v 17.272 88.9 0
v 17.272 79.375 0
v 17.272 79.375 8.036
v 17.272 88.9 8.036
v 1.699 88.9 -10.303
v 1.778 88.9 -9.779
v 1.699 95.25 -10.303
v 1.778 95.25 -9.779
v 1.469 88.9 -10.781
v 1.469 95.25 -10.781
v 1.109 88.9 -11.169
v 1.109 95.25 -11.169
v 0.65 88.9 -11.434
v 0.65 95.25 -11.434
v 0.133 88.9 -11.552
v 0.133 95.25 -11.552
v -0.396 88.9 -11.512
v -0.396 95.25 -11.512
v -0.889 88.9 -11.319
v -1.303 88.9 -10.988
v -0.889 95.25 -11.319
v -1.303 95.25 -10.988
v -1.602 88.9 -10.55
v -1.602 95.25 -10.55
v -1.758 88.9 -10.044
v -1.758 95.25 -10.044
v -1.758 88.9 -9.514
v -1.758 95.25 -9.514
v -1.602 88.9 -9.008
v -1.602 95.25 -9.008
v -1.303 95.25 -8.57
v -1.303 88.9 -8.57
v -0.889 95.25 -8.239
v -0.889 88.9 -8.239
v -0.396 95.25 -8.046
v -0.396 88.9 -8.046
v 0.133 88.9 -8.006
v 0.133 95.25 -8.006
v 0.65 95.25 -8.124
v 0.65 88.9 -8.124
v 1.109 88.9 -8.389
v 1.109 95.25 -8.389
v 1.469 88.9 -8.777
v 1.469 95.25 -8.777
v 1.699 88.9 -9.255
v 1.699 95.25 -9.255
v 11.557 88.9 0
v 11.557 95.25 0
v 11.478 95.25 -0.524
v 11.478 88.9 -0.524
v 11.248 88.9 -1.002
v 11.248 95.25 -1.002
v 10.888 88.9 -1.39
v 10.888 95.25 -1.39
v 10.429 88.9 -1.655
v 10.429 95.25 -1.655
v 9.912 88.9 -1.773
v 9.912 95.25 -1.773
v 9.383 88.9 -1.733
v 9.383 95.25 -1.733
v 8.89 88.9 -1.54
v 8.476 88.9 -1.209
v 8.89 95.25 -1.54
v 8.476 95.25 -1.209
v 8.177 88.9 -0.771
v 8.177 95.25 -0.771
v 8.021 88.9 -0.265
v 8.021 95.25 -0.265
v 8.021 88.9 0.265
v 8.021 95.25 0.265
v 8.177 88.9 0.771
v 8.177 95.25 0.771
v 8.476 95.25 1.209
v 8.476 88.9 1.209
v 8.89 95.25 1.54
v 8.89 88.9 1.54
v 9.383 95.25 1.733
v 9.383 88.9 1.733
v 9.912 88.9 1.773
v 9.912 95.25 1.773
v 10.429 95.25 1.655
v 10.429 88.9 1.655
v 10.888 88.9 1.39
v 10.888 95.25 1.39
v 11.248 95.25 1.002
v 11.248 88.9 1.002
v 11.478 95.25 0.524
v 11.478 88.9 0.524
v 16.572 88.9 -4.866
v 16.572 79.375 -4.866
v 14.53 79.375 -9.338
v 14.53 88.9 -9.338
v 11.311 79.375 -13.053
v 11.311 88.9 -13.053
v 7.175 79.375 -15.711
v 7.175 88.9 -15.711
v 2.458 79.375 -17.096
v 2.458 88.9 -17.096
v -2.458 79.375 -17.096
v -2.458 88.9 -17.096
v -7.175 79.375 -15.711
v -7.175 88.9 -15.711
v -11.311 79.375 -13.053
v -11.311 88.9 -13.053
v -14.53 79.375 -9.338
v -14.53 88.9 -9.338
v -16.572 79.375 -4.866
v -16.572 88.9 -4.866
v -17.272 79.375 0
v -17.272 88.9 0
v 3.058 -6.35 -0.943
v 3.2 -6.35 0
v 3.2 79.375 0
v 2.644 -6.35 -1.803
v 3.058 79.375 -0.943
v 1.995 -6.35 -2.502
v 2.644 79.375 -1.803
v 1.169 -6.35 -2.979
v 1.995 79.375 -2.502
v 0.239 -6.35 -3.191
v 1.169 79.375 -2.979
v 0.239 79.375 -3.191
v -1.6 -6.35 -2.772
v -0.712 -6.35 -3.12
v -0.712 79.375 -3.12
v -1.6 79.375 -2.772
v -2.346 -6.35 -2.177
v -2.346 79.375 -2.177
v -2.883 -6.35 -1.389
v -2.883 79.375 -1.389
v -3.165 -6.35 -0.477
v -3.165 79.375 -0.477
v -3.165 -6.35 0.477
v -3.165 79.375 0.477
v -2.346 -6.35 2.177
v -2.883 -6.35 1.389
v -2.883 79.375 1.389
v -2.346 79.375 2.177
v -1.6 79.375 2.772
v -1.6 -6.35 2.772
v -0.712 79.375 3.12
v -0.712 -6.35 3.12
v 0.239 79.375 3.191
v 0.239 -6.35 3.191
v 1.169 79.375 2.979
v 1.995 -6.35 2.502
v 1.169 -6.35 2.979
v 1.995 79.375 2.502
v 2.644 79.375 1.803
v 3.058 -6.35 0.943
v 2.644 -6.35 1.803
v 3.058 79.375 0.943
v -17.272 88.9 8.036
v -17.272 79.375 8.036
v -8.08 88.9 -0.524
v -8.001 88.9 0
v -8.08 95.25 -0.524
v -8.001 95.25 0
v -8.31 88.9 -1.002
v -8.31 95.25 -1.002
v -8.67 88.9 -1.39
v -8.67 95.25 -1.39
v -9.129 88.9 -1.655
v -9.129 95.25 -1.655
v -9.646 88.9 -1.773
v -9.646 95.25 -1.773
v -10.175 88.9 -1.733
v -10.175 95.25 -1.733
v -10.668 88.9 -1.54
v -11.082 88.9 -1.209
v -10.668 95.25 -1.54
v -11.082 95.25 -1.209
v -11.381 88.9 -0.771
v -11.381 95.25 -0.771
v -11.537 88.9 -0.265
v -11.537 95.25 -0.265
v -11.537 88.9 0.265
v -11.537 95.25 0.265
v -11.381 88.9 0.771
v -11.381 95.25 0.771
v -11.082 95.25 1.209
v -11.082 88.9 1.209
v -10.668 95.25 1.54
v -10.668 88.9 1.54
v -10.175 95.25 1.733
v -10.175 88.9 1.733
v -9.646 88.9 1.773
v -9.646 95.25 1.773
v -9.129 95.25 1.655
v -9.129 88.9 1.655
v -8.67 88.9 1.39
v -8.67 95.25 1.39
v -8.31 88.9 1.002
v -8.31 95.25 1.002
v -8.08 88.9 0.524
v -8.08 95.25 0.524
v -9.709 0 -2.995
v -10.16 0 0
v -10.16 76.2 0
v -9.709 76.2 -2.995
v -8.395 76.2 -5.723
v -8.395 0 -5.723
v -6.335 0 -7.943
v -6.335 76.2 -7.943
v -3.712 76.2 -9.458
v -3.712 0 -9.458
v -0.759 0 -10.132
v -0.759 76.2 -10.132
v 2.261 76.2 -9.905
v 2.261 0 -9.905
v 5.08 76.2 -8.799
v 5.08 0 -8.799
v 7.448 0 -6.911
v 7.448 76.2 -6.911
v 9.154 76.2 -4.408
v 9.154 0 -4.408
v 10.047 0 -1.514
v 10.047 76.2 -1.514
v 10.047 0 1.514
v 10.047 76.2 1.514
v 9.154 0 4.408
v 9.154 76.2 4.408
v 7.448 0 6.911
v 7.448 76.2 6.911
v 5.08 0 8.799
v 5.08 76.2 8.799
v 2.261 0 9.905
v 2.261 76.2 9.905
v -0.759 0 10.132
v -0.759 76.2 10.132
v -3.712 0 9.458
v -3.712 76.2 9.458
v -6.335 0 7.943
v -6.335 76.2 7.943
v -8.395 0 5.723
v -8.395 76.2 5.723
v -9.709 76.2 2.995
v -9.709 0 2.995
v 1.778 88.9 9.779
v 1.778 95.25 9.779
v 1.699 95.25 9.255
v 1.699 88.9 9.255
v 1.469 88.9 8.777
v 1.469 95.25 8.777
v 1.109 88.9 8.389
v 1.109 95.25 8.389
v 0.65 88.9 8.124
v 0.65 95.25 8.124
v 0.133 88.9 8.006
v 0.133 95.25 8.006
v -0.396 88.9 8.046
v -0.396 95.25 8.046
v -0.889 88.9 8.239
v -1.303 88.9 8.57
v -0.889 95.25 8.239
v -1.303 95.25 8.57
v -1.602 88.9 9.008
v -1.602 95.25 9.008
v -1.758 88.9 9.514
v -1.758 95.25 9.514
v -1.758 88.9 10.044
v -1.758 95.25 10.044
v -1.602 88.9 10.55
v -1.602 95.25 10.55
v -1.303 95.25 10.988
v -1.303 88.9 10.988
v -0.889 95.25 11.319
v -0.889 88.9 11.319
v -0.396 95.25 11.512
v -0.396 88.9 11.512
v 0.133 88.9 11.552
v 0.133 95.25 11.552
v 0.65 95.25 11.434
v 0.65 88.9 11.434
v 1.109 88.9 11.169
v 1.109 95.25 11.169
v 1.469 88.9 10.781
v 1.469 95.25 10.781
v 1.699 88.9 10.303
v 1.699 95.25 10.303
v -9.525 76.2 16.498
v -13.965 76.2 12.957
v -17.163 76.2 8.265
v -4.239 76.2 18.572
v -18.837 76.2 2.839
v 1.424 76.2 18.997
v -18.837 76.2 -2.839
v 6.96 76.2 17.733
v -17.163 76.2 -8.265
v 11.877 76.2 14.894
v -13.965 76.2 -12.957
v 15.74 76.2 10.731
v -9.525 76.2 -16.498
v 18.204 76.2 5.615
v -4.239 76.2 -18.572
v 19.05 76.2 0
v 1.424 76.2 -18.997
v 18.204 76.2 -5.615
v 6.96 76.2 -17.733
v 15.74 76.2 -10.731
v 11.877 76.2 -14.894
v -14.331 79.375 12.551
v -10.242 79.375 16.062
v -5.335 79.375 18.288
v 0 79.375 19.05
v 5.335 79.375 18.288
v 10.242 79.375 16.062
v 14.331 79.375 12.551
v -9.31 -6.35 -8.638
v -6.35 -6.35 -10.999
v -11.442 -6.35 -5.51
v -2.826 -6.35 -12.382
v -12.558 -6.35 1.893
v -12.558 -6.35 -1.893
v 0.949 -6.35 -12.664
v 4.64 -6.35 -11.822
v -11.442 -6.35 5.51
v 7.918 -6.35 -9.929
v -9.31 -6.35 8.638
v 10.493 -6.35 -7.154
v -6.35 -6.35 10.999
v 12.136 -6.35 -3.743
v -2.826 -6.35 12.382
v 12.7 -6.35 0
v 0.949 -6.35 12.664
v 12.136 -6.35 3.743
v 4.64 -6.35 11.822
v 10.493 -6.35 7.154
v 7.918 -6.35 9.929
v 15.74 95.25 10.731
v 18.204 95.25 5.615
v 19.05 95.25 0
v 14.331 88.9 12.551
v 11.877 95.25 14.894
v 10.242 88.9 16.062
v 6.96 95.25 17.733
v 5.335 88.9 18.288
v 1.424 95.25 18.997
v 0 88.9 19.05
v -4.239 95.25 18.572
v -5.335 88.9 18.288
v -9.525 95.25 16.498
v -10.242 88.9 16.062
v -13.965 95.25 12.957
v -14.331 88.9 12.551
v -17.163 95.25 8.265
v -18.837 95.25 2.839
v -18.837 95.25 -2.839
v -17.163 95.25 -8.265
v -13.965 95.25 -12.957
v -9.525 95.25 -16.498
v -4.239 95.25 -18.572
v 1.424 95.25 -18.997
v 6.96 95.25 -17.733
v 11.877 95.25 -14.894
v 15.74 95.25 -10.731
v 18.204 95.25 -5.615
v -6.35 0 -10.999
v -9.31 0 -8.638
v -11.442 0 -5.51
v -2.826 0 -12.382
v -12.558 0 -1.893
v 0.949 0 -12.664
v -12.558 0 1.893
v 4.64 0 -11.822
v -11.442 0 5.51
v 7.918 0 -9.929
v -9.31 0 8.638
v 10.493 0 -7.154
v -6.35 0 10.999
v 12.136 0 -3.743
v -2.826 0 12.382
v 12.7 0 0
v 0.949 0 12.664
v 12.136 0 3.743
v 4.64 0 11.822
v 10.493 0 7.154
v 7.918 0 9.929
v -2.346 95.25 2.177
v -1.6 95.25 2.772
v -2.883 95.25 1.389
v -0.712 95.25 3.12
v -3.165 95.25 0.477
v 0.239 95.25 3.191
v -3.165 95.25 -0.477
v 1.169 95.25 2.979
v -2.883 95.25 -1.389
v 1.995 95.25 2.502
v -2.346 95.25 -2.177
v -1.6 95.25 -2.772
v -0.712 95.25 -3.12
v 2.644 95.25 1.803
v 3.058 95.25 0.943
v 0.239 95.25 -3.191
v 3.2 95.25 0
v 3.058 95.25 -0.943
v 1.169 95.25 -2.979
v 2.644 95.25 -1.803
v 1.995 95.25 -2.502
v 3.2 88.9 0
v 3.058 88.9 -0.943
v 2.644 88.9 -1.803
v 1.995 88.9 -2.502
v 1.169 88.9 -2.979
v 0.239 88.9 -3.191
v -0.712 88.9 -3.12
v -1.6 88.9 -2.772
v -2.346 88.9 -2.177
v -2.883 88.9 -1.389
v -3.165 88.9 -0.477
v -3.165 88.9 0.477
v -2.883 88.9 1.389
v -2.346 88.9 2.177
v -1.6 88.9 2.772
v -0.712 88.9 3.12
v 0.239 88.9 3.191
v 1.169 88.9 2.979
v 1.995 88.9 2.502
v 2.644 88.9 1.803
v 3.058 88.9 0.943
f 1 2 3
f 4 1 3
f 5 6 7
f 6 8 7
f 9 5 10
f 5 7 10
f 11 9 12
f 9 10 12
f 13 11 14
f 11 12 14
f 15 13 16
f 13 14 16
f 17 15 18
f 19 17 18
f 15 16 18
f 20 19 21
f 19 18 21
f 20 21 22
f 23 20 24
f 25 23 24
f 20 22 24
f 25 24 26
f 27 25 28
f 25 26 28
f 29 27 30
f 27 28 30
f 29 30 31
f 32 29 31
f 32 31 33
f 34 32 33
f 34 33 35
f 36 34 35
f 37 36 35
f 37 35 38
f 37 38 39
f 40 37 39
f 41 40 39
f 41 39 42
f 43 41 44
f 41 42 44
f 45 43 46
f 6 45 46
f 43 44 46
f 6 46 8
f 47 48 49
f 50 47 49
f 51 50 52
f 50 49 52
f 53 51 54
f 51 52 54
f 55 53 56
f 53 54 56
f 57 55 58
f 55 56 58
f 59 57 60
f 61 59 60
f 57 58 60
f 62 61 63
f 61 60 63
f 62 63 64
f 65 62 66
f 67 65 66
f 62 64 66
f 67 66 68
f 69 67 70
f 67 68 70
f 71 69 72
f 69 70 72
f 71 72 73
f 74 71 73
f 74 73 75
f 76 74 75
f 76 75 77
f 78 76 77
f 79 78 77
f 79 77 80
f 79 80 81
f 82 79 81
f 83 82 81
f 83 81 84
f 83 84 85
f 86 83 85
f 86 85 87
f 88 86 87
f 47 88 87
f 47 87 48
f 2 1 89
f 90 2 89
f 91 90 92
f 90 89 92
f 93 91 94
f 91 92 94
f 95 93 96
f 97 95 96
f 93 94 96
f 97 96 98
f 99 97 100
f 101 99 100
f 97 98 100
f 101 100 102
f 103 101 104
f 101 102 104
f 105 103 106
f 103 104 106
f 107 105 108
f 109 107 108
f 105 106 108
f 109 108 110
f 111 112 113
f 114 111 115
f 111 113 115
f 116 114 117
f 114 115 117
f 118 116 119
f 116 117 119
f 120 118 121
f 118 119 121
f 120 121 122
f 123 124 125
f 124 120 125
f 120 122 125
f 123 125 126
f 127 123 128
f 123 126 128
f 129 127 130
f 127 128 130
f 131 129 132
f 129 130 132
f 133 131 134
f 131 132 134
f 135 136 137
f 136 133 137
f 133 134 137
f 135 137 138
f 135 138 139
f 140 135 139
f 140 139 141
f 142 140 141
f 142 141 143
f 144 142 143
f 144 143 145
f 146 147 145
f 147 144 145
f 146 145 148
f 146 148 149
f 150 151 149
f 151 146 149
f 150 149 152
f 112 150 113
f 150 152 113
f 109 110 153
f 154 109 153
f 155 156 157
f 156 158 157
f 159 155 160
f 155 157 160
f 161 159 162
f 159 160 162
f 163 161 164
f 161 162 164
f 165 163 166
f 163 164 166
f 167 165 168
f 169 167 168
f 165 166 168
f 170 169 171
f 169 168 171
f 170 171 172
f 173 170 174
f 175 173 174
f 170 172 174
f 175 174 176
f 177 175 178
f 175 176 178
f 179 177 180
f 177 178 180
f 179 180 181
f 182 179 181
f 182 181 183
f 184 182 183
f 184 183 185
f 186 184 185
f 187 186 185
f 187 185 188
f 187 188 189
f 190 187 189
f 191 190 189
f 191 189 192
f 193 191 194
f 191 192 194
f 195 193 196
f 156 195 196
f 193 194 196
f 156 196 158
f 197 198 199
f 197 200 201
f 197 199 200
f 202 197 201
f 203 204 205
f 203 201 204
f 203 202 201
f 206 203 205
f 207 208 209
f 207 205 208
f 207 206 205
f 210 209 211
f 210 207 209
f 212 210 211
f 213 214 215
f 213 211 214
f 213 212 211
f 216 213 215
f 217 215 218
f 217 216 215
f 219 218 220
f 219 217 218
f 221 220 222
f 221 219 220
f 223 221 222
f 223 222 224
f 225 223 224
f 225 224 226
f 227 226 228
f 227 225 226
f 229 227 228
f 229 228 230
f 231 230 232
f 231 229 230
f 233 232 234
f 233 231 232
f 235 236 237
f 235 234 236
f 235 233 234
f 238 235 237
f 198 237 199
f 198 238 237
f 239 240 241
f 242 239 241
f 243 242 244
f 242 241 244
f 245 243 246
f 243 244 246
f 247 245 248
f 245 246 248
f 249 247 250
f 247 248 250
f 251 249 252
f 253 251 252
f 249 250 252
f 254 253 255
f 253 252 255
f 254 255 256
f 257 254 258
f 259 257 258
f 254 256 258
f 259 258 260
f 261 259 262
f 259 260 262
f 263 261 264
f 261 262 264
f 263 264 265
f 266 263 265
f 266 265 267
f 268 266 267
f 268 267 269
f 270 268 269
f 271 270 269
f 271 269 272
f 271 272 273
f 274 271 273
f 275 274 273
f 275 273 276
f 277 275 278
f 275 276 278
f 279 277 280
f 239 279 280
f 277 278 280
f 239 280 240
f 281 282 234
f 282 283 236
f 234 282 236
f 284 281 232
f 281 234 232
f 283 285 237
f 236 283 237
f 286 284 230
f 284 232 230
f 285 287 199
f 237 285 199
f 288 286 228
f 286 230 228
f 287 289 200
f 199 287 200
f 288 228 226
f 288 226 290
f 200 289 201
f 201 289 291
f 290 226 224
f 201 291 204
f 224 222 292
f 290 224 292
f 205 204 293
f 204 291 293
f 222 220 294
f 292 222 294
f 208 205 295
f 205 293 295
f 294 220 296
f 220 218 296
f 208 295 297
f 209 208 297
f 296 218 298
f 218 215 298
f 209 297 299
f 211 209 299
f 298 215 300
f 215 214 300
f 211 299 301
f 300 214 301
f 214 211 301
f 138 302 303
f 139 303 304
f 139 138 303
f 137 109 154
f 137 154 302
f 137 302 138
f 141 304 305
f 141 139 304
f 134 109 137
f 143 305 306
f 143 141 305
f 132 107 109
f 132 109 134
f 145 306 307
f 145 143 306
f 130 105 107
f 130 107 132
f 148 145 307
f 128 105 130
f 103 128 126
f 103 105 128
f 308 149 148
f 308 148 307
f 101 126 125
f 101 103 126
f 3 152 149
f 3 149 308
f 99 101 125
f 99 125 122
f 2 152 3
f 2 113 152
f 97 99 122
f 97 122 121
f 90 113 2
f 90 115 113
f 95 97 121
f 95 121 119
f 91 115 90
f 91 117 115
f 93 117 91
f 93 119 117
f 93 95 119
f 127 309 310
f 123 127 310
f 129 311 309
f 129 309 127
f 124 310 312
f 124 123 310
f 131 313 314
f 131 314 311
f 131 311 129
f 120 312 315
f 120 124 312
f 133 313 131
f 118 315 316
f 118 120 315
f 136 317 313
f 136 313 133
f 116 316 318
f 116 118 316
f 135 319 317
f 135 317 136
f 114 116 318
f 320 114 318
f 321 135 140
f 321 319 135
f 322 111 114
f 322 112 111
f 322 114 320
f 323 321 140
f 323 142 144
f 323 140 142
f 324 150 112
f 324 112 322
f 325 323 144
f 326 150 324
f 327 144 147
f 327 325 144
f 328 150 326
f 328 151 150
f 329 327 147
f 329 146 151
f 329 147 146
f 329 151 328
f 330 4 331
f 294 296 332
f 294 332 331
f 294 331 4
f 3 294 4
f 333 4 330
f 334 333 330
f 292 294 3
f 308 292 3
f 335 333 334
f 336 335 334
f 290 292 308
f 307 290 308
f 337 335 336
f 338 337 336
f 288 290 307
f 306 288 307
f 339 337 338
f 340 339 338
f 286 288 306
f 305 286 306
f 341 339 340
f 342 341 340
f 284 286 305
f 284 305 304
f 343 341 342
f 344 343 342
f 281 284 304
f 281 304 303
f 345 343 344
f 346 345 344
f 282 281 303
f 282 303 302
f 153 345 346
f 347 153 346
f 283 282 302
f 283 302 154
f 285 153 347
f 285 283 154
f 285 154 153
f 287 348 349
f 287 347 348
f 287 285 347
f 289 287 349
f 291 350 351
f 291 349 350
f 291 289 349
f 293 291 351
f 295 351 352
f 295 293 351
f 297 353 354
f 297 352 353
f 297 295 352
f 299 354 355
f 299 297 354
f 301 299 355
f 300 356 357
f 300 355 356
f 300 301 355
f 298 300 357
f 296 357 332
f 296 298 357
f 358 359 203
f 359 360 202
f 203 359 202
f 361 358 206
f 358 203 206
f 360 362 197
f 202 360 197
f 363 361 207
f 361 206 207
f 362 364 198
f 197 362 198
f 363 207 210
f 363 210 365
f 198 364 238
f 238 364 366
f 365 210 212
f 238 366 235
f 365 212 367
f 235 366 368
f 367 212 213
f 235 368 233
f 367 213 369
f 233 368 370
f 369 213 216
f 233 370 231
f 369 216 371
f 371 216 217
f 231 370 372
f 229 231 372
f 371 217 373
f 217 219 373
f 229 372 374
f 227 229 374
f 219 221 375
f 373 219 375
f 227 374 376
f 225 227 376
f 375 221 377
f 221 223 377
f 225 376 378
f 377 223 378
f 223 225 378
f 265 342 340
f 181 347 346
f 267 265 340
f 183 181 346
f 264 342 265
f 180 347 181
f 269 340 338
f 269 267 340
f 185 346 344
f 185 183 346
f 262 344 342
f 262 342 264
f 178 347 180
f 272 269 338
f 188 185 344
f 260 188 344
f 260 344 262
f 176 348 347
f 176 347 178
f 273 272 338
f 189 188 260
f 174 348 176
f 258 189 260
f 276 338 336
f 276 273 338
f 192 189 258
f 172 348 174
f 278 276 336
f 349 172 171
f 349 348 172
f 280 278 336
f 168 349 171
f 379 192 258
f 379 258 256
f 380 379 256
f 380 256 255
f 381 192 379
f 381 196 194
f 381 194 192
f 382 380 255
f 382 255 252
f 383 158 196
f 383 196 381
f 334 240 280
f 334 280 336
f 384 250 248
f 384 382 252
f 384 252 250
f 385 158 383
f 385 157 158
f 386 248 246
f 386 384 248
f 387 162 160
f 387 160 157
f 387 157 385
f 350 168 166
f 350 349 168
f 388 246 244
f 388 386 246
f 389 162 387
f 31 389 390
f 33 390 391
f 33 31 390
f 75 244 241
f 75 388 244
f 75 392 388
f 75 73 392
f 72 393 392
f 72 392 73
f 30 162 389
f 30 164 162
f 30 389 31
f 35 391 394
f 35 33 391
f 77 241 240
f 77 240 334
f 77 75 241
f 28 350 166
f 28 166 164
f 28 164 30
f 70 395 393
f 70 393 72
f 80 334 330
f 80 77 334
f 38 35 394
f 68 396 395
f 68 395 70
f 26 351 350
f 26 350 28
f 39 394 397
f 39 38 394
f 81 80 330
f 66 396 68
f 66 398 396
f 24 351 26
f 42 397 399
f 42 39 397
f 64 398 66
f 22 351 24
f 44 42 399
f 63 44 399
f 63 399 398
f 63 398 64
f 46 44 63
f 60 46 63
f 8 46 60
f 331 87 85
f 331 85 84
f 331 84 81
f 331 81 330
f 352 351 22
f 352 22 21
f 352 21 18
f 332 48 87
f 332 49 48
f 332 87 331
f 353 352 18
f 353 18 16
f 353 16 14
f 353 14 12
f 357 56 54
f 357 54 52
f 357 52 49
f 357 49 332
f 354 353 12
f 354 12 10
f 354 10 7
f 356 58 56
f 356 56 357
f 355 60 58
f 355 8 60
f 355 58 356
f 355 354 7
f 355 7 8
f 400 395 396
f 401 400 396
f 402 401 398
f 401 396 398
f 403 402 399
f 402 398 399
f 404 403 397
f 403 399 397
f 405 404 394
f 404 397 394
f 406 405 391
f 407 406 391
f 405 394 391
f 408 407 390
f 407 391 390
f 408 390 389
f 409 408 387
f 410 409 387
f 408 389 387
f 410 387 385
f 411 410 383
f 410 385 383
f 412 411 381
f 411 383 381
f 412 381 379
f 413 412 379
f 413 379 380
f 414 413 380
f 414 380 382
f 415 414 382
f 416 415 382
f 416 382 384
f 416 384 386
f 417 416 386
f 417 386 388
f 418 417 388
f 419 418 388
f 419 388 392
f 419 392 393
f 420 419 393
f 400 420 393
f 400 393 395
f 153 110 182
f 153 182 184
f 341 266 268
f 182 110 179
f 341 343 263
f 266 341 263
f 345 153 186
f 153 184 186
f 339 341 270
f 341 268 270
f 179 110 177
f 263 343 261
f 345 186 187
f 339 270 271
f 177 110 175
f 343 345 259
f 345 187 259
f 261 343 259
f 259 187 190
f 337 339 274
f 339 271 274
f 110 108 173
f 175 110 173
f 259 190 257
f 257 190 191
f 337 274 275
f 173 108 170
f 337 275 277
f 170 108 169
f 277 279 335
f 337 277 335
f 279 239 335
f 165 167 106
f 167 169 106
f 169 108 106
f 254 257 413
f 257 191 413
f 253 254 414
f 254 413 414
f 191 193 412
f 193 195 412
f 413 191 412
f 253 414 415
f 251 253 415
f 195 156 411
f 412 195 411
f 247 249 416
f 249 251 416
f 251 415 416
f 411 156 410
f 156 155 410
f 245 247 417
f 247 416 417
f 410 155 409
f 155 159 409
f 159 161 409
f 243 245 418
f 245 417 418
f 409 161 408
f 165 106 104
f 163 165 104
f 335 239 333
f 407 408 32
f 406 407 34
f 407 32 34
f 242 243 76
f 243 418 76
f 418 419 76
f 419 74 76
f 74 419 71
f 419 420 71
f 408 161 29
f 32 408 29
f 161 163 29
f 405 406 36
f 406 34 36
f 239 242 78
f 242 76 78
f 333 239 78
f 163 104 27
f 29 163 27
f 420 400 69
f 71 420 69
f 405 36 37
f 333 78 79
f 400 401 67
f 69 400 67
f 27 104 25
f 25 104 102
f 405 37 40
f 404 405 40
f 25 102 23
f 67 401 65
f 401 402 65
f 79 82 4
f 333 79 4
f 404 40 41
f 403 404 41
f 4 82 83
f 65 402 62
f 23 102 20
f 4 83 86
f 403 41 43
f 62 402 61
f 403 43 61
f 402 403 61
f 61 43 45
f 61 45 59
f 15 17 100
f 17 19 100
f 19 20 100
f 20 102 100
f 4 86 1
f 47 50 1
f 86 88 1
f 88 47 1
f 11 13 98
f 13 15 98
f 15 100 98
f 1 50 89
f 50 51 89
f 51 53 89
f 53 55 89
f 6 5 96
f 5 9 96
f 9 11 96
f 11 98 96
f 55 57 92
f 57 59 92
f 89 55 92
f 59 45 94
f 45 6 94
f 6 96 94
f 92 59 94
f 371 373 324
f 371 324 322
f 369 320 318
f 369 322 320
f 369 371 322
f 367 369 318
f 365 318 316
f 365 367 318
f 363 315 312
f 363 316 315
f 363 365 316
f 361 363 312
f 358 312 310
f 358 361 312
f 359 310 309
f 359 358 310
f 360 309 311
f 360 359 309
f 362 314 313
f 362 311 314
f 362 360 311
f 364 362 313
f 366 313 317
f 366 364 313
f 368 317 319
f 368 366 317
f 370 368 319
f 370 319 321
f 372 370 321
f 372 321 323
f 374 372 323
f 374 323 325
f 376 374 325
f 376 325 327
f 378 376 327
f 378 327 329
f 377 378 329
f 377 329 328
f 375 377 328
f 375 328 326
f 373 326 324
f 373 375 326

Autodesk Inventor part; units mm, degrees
ref_plane "YZ Plane" through (0, 0, 0) normal (1, 0, 0) x (0, 1, 0)
ref_plane "XZ Plane" through (0, 0, 0) normal (0, 1, 0) x (-1, 0, 0)
ref_plane "XY Plane" through (0, 0, 0) normal (0, 0, 1) x (1, 0, 0)
sketch "Sketch1" plane through (0, 0, 0) normal (0, 1, 0) x (-1, 0, 0)
  circle A0 centre (0, 0) radius 10.16
  dimension "d0" = 20.32
extrude "Extrusion1" add sketch "Sketch1" along normal blind 76.2
sketch "Sketch2" plane through (0, 76.2, 0) normal (0, 1, 0) x (1, 0, 0)
  circle A0 centre (0, 0) radius 19.05
  dimension "d3" = 38.1
extrude "Extrusion2" add sketch "Sketch2" along normal blind 12.7
sketch "Sketch6" plane through (0, 88.9, 0) normal (0, 1, 0) x (1, 0, 0)
  arc A0 (17.272, 0) -> (-17.272, 0) centre (0, 0) ccw
  line L0 (17.272, 0) -> (17.272, -8.0362)
  circle A1 centre (0, 0) radius 19.05 projected
  line L1 (-17.272, 0) -> (-17.272, -8.5424)
  line L2 (17.272, -8.0362) -> (17.272, -33.241)
  line L3 (17.272, -33.241) -> (-17.272, -33.241)
  line L4 (-17.272, -33.241) -> (-17.272, -8.5424)
  dimension "d14" = 34.544
extrude "Extrusion5" cut sketch "Sketch6" against normal blind 9.525 contours L0 A1 L1 A0 | L2 L3 L4 L1 A1 picked at (0, -6.35)
sketch "Sketch7" plane through (0, 88.9, 0) normal (0, 1, 0) x (1, 0, 0)
  circle A0 centre (0, 0) radius 19.05
extrude "Extrusion6" add sketch "Sketch7" along normal blind 6.35
sketch "Sketch8" plane through (0, 95.25, 0) normal (0, 1, 0) x (1, 0, 0)
  circle A0 centre (0, 0) radius 9.779
  circle A1 centre (9.779, 0) radius 1.778
  circle A2 centre (0, -9.779) radius 1.778
  circle A3 centre (-9.779, 0) radius 1.778
  circle A4 centre (0, 9.779) radius 1.778
  dimension "d19" = 19.558
  dimension "d20" = 3.556
  dimension "d21" = 3.556
  dimension "d22" = 3.556
  dimension "d23" = 3.556
extrude "Extrusion7" cut sketch "Sketch8" against normal blind 6.35 contours A0 A1 | A0 A1 | A4 A0 | A0 A4 | A2 A0 | A0 A2 | A3 A0 | A0 A3
sketch "Sketch9" plane through (0, 95.25, 0) normal (0, 1, 0) x (1, 0, 0)
  circle A0 centre (0, 0) radius 10.16 projected
  circle A1 centre (0, 0) radius 3.2004
  dimension "d26" = 6.4008
extrude "Extrusion8" cut sketch "Sketch9" against normal through all contours A1
sketch "Sketch10" plane through (0, 0, 0) normal (0, -1, 0) x (1, 0, 0)
  circle A0 centre (0, 0) radius 12.7
  circle A1 centre (0, 0) radius 3.2004
  dimension "d29" = 25.4
extrude "Extrusion9" add sketch "Sketch10" along normal blind 6.35
properties part number "Rotating1inPart"
